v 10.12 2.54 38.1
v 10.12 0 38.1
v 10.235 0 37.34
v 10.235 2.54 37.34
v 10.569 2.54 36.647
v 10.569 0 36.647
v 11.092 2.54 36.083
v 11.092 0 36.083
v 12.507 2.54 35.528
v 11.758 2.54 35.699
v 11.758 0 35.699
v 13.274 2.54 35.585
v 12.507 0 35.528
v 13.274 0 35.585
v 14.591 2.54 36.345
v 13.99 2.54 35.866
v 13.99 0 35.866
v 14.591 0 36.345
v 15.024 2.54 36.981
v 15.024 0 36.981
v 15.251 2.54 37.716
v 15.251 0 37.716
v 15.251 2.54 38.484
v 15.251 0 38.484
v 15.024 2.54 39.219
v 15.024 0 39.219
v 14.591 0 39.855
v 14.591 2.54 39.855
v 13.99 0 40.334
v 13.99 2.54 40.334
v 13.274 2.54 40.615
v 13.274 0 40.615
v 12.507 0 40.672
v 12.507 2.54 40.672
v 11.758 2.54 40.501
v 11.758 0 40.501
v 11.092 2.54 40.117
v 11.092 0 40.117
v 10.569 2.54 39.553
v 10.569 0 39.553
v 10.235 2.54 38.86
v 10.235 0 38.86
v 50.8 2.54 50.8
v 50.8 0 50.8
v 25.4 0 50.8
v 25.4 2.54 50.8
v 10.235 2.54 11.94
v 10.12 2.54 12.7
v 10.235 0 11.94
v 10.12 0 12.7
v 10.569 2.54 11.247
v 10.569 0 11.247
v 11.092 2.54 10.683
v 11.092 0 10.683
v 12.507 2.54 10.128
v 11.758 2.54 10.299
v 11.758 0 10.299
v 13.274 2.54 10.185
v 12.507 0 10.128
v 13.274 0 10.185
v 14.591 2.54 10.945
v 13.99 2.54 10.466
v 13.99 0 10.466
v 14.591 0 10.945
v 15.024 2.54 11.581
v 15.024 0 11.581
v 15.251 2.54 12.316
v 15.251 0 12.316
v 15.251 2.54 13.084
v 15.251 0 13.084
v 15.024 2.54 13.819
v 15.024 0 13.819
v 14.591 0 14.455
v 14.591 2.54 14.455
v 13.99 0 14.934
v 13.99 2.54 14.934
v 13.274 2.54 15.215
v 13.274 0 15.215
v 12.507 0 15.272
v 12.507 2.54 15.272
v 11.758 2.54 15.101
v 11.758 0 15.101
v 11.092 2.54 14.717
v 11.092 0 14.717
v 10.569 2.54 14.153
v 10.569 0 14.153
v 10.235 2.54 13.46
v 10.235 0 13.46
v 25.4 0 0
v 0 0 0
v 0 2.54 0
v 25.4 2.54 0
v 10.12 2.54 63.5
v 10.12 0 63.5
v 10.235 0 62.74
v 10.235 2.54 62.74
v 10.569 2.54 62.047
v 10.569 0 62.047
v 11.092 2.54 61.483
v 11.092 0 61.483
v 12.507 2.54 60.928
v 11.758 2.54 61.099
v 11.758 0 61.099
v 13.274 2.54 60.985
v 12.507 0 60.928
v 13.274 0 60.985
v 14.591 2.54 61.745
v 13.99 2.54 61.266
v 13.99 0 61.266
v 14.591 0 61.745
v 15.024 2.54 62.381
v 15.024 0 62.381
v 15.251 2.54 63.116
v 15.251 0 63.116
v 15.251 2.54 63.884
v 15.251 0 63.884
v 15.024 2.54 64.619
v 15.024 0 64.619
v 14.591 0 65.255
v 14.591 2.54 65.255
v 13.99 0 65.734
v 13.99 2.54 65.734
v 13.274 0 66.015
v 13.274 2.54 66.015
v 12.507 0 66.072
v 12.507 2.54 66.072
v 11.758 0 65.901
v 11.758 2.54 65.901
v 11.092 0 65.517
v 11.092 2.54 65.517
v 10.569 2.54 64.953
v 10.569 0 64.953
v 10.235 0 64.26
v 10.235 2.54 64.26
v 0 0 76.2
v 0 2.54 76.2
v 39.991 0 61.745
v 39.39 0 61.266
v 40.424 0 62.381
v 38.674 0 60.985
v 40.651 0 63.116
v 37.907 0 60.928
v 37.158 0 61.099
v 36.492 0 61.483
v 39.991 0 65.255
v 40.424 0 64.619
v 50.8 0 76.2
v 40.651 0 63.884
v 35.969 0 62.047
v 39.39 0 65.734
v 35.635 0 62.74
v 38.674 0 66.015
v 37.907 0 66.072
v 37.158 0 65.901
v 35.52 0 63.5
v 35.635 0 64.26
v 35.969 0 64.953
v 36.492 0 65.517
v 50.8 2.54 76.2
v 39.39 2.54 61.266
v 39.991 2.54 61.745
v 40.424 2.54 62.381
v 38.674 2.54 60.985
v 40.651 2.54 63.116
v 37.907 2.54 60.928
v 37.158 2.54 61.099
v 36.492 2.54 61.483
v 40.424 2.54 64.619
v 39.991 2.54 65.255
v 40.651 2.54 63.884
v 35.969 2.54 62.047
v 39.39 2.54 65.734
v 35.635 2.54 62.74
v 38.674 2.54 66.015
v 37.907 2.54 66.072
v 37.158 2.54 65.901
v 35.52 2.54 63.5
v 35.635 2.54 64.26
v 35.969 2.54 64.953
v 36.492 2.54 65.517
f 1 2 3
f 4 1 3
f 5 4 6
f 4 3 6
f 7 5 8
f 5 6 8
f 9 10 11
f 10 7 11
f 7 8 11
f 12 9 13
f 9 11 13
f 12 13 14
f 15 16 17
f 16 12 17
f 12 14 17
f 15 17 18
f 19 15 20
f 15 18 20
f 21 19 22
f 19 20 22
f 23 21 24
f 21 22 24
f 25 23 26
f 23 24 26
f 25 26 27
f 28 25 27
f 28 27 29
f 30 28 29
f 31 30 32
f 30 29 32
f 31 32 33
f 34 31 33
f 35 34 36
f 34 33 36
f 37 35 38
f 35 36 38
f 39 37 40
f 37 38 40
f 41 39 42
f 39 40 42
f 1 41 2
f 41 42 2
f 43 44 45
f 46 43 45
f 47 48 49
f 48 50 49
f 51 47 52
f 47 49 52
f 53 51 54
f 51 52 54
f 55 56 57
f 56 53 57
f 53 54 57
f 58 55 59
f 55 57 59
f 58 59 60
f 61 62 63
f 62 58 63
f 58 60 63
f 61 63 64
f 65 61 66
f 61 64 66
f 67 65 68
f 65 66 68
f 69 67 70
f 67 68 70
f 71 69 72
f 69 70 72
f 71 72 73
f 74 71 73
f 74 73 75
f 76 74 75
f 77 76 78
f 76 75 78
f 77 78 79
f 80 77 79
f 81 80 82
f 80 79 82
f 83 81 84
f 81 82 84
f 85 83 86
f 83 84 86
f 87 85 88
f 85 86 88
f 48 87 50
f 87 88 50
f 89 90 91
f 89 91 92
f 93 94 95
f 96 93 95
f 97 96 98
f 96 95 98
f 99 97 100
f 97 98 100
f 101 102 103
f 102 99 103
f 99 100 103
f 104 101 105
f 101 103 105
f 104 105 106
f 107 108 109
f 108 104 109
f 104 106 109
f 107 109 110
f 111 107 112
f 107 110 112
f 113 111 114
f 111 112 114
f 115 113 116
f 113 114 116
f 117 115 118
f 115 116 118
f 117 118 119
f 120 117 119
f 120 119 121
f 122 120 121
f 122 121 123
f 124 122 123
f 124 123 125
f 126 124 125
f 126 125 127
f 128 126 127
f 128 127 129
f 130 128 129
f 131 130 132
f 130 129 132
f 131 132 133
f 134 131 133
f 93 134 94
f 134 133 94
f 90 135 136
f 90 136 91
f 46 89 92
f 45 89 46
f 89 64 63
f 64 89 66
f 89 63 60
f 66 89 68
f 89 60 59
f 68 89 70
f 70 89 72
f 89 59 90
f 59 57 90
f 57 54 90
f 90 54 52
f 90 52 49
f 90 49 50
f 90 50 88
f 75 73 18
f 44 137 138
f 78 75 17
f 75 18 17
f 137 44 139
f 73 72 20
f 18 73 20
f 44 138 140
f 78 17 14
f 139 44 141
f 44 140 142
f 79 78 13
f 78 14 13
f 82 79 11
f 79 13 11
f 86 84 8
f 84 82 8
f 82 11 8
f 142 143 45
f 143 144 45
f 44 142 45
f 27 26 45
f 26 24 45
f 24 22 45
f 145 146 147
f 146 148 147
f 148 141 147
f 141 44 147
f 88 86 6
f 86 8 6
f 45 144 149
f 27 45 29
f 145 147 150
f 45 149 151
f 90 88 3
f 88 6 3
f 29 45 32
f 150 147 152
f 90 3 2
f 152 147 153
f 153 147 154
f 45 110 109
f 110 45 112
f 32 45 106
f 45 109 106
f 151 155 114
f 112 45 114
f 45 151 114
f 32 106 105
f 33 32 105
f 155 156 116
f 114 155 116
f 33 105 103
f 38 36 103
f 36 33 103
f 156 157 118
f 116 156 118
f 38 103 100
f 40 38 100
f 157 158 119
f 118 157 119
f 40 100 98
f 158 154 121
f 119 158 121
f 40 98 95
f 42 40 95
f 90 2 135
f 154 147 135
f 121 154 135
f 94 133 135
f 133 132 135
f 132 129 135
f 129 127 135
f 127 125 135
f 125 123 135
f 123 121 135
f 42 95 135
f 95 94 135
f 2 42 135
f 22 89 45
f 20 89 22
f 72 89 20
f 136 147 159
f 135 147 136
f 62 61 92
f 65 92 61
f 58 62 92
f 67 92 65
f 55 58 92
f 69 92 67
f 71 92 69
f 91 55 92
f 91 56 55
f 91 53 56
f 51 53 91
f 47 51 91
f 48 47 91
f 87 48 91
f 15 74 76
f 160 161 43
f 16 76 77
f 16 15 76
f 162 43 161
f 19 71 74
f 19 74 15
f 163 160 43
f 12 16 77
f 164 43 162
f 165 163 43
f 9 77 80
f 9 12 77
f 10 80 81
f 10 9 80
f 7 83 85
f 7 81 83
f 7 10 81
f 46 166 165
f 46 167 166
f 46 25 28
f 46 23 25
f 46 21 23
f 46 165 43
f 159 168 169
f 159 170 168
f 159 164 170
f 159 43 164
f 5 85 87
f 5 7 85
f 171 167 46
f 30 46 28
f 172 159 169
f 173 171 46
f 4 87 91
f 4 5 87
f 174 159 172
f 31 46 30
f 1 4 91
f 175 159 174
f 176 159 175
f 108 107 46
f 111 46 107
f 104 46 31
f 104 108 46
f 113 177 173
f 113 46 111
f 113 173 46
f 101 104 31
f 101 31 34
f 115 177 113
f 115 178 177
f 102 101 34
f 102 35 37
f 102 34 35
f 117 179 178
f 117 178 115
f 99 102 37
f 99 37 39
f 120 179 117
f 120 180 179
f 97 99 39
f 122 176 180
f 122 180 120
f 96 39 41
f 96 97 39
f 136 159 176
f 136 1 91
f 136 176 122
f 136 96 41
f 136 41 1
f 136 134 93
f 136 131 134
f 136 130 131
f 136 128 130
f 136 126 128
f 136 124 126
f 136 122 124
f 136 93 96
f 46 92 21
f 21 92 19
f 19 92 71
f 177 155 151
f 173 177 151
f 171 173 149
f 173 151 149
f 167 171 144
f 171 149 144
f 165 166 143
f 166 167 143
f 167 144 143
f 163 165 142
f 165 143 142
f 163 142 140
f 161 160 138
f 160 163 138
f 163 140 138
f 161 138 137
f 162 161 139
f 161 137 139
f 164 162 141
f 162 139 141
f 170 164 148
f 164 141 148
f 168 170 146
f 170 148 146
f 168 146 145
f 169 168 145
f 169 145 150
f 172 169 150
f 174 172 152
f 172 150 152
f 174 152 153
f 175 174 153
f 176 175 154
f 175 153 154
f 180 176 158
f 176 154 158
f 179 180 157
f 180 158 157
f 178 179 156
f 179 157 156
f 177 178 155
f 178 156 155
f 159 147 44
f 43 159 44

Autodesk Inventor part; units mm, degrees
ref_plane "YZ Plane" through (0, 0, 0) normal (1, 0, 0) x (0, 1, 0)
ref_plane "XZ Plane" through (0, 0, 0) normal (0, 1, 0) x (-1, 0, 0)
ref_plane "XY Plane" through (0, 0, 0) normal (0, 0, 1) x (1, 0, 0)
sketch "Sketch1" plane through (0, 0, 0) normal (0, 1, 0) x (-1, 0, 0)
  line L0 (0, 0) -> (-25.4, 0)
  line L1 (-25.4, 0) -> (-25.4, 76.2)
  line L2 (-25.4, 76.2) -> (0, 76.2)
  line L3 (0, 76.2) -> (0, 0)
  line L4 (-25.4, 76.2) -> (-50.8, 76.2)
  line L5 (-50.8, 76.2) -> (-50.8, 50.8)
  line L6 (-50.8, 50.8) -> (-25.4, 50.8)
  line L7 (-25.4, 50.8) -> (-25.4, 76.2)
  circle A0 centre (-12.7, 12.7) radius 2.5797
  circle A1 centre (-38.1, 63.5) radius 2.5797
  circle A2 centre (-12.7, 38.1) radius 2.5797
  circle A3 centre (-12.7, 63.5) radius 2.5797
  dimension "d0" = 76.2
  dimension "d1" = 25.4
  dimension "d2" = 25.4
  dimension "d3" = 25.4
  dimension "d5" = 38.1
  dimension "d7" = 25.4
  dimension "d8" = 25.4
  dimension "d11" = 12.7
  dimension "d12" = 12.7
  dimension "d13" = 12.7
  dimension "d14" = 5.1594
  dimension "d15" = 5.1594
  dimension "d16" = 5.1594
  dimension "d17" = 5.1594
  dimension "d18" = 12.7
  dimension "d19" = 25.4
  dimension "d20" = 12.7
extrude "Extrusion1" add sketch "Sketch1" along normal blind 2.54
equation "\"d15\" = d14"
equation "\"d16\" = d14"
equation "\"d17\" = d14"
properties part number "bracing 2x3"
